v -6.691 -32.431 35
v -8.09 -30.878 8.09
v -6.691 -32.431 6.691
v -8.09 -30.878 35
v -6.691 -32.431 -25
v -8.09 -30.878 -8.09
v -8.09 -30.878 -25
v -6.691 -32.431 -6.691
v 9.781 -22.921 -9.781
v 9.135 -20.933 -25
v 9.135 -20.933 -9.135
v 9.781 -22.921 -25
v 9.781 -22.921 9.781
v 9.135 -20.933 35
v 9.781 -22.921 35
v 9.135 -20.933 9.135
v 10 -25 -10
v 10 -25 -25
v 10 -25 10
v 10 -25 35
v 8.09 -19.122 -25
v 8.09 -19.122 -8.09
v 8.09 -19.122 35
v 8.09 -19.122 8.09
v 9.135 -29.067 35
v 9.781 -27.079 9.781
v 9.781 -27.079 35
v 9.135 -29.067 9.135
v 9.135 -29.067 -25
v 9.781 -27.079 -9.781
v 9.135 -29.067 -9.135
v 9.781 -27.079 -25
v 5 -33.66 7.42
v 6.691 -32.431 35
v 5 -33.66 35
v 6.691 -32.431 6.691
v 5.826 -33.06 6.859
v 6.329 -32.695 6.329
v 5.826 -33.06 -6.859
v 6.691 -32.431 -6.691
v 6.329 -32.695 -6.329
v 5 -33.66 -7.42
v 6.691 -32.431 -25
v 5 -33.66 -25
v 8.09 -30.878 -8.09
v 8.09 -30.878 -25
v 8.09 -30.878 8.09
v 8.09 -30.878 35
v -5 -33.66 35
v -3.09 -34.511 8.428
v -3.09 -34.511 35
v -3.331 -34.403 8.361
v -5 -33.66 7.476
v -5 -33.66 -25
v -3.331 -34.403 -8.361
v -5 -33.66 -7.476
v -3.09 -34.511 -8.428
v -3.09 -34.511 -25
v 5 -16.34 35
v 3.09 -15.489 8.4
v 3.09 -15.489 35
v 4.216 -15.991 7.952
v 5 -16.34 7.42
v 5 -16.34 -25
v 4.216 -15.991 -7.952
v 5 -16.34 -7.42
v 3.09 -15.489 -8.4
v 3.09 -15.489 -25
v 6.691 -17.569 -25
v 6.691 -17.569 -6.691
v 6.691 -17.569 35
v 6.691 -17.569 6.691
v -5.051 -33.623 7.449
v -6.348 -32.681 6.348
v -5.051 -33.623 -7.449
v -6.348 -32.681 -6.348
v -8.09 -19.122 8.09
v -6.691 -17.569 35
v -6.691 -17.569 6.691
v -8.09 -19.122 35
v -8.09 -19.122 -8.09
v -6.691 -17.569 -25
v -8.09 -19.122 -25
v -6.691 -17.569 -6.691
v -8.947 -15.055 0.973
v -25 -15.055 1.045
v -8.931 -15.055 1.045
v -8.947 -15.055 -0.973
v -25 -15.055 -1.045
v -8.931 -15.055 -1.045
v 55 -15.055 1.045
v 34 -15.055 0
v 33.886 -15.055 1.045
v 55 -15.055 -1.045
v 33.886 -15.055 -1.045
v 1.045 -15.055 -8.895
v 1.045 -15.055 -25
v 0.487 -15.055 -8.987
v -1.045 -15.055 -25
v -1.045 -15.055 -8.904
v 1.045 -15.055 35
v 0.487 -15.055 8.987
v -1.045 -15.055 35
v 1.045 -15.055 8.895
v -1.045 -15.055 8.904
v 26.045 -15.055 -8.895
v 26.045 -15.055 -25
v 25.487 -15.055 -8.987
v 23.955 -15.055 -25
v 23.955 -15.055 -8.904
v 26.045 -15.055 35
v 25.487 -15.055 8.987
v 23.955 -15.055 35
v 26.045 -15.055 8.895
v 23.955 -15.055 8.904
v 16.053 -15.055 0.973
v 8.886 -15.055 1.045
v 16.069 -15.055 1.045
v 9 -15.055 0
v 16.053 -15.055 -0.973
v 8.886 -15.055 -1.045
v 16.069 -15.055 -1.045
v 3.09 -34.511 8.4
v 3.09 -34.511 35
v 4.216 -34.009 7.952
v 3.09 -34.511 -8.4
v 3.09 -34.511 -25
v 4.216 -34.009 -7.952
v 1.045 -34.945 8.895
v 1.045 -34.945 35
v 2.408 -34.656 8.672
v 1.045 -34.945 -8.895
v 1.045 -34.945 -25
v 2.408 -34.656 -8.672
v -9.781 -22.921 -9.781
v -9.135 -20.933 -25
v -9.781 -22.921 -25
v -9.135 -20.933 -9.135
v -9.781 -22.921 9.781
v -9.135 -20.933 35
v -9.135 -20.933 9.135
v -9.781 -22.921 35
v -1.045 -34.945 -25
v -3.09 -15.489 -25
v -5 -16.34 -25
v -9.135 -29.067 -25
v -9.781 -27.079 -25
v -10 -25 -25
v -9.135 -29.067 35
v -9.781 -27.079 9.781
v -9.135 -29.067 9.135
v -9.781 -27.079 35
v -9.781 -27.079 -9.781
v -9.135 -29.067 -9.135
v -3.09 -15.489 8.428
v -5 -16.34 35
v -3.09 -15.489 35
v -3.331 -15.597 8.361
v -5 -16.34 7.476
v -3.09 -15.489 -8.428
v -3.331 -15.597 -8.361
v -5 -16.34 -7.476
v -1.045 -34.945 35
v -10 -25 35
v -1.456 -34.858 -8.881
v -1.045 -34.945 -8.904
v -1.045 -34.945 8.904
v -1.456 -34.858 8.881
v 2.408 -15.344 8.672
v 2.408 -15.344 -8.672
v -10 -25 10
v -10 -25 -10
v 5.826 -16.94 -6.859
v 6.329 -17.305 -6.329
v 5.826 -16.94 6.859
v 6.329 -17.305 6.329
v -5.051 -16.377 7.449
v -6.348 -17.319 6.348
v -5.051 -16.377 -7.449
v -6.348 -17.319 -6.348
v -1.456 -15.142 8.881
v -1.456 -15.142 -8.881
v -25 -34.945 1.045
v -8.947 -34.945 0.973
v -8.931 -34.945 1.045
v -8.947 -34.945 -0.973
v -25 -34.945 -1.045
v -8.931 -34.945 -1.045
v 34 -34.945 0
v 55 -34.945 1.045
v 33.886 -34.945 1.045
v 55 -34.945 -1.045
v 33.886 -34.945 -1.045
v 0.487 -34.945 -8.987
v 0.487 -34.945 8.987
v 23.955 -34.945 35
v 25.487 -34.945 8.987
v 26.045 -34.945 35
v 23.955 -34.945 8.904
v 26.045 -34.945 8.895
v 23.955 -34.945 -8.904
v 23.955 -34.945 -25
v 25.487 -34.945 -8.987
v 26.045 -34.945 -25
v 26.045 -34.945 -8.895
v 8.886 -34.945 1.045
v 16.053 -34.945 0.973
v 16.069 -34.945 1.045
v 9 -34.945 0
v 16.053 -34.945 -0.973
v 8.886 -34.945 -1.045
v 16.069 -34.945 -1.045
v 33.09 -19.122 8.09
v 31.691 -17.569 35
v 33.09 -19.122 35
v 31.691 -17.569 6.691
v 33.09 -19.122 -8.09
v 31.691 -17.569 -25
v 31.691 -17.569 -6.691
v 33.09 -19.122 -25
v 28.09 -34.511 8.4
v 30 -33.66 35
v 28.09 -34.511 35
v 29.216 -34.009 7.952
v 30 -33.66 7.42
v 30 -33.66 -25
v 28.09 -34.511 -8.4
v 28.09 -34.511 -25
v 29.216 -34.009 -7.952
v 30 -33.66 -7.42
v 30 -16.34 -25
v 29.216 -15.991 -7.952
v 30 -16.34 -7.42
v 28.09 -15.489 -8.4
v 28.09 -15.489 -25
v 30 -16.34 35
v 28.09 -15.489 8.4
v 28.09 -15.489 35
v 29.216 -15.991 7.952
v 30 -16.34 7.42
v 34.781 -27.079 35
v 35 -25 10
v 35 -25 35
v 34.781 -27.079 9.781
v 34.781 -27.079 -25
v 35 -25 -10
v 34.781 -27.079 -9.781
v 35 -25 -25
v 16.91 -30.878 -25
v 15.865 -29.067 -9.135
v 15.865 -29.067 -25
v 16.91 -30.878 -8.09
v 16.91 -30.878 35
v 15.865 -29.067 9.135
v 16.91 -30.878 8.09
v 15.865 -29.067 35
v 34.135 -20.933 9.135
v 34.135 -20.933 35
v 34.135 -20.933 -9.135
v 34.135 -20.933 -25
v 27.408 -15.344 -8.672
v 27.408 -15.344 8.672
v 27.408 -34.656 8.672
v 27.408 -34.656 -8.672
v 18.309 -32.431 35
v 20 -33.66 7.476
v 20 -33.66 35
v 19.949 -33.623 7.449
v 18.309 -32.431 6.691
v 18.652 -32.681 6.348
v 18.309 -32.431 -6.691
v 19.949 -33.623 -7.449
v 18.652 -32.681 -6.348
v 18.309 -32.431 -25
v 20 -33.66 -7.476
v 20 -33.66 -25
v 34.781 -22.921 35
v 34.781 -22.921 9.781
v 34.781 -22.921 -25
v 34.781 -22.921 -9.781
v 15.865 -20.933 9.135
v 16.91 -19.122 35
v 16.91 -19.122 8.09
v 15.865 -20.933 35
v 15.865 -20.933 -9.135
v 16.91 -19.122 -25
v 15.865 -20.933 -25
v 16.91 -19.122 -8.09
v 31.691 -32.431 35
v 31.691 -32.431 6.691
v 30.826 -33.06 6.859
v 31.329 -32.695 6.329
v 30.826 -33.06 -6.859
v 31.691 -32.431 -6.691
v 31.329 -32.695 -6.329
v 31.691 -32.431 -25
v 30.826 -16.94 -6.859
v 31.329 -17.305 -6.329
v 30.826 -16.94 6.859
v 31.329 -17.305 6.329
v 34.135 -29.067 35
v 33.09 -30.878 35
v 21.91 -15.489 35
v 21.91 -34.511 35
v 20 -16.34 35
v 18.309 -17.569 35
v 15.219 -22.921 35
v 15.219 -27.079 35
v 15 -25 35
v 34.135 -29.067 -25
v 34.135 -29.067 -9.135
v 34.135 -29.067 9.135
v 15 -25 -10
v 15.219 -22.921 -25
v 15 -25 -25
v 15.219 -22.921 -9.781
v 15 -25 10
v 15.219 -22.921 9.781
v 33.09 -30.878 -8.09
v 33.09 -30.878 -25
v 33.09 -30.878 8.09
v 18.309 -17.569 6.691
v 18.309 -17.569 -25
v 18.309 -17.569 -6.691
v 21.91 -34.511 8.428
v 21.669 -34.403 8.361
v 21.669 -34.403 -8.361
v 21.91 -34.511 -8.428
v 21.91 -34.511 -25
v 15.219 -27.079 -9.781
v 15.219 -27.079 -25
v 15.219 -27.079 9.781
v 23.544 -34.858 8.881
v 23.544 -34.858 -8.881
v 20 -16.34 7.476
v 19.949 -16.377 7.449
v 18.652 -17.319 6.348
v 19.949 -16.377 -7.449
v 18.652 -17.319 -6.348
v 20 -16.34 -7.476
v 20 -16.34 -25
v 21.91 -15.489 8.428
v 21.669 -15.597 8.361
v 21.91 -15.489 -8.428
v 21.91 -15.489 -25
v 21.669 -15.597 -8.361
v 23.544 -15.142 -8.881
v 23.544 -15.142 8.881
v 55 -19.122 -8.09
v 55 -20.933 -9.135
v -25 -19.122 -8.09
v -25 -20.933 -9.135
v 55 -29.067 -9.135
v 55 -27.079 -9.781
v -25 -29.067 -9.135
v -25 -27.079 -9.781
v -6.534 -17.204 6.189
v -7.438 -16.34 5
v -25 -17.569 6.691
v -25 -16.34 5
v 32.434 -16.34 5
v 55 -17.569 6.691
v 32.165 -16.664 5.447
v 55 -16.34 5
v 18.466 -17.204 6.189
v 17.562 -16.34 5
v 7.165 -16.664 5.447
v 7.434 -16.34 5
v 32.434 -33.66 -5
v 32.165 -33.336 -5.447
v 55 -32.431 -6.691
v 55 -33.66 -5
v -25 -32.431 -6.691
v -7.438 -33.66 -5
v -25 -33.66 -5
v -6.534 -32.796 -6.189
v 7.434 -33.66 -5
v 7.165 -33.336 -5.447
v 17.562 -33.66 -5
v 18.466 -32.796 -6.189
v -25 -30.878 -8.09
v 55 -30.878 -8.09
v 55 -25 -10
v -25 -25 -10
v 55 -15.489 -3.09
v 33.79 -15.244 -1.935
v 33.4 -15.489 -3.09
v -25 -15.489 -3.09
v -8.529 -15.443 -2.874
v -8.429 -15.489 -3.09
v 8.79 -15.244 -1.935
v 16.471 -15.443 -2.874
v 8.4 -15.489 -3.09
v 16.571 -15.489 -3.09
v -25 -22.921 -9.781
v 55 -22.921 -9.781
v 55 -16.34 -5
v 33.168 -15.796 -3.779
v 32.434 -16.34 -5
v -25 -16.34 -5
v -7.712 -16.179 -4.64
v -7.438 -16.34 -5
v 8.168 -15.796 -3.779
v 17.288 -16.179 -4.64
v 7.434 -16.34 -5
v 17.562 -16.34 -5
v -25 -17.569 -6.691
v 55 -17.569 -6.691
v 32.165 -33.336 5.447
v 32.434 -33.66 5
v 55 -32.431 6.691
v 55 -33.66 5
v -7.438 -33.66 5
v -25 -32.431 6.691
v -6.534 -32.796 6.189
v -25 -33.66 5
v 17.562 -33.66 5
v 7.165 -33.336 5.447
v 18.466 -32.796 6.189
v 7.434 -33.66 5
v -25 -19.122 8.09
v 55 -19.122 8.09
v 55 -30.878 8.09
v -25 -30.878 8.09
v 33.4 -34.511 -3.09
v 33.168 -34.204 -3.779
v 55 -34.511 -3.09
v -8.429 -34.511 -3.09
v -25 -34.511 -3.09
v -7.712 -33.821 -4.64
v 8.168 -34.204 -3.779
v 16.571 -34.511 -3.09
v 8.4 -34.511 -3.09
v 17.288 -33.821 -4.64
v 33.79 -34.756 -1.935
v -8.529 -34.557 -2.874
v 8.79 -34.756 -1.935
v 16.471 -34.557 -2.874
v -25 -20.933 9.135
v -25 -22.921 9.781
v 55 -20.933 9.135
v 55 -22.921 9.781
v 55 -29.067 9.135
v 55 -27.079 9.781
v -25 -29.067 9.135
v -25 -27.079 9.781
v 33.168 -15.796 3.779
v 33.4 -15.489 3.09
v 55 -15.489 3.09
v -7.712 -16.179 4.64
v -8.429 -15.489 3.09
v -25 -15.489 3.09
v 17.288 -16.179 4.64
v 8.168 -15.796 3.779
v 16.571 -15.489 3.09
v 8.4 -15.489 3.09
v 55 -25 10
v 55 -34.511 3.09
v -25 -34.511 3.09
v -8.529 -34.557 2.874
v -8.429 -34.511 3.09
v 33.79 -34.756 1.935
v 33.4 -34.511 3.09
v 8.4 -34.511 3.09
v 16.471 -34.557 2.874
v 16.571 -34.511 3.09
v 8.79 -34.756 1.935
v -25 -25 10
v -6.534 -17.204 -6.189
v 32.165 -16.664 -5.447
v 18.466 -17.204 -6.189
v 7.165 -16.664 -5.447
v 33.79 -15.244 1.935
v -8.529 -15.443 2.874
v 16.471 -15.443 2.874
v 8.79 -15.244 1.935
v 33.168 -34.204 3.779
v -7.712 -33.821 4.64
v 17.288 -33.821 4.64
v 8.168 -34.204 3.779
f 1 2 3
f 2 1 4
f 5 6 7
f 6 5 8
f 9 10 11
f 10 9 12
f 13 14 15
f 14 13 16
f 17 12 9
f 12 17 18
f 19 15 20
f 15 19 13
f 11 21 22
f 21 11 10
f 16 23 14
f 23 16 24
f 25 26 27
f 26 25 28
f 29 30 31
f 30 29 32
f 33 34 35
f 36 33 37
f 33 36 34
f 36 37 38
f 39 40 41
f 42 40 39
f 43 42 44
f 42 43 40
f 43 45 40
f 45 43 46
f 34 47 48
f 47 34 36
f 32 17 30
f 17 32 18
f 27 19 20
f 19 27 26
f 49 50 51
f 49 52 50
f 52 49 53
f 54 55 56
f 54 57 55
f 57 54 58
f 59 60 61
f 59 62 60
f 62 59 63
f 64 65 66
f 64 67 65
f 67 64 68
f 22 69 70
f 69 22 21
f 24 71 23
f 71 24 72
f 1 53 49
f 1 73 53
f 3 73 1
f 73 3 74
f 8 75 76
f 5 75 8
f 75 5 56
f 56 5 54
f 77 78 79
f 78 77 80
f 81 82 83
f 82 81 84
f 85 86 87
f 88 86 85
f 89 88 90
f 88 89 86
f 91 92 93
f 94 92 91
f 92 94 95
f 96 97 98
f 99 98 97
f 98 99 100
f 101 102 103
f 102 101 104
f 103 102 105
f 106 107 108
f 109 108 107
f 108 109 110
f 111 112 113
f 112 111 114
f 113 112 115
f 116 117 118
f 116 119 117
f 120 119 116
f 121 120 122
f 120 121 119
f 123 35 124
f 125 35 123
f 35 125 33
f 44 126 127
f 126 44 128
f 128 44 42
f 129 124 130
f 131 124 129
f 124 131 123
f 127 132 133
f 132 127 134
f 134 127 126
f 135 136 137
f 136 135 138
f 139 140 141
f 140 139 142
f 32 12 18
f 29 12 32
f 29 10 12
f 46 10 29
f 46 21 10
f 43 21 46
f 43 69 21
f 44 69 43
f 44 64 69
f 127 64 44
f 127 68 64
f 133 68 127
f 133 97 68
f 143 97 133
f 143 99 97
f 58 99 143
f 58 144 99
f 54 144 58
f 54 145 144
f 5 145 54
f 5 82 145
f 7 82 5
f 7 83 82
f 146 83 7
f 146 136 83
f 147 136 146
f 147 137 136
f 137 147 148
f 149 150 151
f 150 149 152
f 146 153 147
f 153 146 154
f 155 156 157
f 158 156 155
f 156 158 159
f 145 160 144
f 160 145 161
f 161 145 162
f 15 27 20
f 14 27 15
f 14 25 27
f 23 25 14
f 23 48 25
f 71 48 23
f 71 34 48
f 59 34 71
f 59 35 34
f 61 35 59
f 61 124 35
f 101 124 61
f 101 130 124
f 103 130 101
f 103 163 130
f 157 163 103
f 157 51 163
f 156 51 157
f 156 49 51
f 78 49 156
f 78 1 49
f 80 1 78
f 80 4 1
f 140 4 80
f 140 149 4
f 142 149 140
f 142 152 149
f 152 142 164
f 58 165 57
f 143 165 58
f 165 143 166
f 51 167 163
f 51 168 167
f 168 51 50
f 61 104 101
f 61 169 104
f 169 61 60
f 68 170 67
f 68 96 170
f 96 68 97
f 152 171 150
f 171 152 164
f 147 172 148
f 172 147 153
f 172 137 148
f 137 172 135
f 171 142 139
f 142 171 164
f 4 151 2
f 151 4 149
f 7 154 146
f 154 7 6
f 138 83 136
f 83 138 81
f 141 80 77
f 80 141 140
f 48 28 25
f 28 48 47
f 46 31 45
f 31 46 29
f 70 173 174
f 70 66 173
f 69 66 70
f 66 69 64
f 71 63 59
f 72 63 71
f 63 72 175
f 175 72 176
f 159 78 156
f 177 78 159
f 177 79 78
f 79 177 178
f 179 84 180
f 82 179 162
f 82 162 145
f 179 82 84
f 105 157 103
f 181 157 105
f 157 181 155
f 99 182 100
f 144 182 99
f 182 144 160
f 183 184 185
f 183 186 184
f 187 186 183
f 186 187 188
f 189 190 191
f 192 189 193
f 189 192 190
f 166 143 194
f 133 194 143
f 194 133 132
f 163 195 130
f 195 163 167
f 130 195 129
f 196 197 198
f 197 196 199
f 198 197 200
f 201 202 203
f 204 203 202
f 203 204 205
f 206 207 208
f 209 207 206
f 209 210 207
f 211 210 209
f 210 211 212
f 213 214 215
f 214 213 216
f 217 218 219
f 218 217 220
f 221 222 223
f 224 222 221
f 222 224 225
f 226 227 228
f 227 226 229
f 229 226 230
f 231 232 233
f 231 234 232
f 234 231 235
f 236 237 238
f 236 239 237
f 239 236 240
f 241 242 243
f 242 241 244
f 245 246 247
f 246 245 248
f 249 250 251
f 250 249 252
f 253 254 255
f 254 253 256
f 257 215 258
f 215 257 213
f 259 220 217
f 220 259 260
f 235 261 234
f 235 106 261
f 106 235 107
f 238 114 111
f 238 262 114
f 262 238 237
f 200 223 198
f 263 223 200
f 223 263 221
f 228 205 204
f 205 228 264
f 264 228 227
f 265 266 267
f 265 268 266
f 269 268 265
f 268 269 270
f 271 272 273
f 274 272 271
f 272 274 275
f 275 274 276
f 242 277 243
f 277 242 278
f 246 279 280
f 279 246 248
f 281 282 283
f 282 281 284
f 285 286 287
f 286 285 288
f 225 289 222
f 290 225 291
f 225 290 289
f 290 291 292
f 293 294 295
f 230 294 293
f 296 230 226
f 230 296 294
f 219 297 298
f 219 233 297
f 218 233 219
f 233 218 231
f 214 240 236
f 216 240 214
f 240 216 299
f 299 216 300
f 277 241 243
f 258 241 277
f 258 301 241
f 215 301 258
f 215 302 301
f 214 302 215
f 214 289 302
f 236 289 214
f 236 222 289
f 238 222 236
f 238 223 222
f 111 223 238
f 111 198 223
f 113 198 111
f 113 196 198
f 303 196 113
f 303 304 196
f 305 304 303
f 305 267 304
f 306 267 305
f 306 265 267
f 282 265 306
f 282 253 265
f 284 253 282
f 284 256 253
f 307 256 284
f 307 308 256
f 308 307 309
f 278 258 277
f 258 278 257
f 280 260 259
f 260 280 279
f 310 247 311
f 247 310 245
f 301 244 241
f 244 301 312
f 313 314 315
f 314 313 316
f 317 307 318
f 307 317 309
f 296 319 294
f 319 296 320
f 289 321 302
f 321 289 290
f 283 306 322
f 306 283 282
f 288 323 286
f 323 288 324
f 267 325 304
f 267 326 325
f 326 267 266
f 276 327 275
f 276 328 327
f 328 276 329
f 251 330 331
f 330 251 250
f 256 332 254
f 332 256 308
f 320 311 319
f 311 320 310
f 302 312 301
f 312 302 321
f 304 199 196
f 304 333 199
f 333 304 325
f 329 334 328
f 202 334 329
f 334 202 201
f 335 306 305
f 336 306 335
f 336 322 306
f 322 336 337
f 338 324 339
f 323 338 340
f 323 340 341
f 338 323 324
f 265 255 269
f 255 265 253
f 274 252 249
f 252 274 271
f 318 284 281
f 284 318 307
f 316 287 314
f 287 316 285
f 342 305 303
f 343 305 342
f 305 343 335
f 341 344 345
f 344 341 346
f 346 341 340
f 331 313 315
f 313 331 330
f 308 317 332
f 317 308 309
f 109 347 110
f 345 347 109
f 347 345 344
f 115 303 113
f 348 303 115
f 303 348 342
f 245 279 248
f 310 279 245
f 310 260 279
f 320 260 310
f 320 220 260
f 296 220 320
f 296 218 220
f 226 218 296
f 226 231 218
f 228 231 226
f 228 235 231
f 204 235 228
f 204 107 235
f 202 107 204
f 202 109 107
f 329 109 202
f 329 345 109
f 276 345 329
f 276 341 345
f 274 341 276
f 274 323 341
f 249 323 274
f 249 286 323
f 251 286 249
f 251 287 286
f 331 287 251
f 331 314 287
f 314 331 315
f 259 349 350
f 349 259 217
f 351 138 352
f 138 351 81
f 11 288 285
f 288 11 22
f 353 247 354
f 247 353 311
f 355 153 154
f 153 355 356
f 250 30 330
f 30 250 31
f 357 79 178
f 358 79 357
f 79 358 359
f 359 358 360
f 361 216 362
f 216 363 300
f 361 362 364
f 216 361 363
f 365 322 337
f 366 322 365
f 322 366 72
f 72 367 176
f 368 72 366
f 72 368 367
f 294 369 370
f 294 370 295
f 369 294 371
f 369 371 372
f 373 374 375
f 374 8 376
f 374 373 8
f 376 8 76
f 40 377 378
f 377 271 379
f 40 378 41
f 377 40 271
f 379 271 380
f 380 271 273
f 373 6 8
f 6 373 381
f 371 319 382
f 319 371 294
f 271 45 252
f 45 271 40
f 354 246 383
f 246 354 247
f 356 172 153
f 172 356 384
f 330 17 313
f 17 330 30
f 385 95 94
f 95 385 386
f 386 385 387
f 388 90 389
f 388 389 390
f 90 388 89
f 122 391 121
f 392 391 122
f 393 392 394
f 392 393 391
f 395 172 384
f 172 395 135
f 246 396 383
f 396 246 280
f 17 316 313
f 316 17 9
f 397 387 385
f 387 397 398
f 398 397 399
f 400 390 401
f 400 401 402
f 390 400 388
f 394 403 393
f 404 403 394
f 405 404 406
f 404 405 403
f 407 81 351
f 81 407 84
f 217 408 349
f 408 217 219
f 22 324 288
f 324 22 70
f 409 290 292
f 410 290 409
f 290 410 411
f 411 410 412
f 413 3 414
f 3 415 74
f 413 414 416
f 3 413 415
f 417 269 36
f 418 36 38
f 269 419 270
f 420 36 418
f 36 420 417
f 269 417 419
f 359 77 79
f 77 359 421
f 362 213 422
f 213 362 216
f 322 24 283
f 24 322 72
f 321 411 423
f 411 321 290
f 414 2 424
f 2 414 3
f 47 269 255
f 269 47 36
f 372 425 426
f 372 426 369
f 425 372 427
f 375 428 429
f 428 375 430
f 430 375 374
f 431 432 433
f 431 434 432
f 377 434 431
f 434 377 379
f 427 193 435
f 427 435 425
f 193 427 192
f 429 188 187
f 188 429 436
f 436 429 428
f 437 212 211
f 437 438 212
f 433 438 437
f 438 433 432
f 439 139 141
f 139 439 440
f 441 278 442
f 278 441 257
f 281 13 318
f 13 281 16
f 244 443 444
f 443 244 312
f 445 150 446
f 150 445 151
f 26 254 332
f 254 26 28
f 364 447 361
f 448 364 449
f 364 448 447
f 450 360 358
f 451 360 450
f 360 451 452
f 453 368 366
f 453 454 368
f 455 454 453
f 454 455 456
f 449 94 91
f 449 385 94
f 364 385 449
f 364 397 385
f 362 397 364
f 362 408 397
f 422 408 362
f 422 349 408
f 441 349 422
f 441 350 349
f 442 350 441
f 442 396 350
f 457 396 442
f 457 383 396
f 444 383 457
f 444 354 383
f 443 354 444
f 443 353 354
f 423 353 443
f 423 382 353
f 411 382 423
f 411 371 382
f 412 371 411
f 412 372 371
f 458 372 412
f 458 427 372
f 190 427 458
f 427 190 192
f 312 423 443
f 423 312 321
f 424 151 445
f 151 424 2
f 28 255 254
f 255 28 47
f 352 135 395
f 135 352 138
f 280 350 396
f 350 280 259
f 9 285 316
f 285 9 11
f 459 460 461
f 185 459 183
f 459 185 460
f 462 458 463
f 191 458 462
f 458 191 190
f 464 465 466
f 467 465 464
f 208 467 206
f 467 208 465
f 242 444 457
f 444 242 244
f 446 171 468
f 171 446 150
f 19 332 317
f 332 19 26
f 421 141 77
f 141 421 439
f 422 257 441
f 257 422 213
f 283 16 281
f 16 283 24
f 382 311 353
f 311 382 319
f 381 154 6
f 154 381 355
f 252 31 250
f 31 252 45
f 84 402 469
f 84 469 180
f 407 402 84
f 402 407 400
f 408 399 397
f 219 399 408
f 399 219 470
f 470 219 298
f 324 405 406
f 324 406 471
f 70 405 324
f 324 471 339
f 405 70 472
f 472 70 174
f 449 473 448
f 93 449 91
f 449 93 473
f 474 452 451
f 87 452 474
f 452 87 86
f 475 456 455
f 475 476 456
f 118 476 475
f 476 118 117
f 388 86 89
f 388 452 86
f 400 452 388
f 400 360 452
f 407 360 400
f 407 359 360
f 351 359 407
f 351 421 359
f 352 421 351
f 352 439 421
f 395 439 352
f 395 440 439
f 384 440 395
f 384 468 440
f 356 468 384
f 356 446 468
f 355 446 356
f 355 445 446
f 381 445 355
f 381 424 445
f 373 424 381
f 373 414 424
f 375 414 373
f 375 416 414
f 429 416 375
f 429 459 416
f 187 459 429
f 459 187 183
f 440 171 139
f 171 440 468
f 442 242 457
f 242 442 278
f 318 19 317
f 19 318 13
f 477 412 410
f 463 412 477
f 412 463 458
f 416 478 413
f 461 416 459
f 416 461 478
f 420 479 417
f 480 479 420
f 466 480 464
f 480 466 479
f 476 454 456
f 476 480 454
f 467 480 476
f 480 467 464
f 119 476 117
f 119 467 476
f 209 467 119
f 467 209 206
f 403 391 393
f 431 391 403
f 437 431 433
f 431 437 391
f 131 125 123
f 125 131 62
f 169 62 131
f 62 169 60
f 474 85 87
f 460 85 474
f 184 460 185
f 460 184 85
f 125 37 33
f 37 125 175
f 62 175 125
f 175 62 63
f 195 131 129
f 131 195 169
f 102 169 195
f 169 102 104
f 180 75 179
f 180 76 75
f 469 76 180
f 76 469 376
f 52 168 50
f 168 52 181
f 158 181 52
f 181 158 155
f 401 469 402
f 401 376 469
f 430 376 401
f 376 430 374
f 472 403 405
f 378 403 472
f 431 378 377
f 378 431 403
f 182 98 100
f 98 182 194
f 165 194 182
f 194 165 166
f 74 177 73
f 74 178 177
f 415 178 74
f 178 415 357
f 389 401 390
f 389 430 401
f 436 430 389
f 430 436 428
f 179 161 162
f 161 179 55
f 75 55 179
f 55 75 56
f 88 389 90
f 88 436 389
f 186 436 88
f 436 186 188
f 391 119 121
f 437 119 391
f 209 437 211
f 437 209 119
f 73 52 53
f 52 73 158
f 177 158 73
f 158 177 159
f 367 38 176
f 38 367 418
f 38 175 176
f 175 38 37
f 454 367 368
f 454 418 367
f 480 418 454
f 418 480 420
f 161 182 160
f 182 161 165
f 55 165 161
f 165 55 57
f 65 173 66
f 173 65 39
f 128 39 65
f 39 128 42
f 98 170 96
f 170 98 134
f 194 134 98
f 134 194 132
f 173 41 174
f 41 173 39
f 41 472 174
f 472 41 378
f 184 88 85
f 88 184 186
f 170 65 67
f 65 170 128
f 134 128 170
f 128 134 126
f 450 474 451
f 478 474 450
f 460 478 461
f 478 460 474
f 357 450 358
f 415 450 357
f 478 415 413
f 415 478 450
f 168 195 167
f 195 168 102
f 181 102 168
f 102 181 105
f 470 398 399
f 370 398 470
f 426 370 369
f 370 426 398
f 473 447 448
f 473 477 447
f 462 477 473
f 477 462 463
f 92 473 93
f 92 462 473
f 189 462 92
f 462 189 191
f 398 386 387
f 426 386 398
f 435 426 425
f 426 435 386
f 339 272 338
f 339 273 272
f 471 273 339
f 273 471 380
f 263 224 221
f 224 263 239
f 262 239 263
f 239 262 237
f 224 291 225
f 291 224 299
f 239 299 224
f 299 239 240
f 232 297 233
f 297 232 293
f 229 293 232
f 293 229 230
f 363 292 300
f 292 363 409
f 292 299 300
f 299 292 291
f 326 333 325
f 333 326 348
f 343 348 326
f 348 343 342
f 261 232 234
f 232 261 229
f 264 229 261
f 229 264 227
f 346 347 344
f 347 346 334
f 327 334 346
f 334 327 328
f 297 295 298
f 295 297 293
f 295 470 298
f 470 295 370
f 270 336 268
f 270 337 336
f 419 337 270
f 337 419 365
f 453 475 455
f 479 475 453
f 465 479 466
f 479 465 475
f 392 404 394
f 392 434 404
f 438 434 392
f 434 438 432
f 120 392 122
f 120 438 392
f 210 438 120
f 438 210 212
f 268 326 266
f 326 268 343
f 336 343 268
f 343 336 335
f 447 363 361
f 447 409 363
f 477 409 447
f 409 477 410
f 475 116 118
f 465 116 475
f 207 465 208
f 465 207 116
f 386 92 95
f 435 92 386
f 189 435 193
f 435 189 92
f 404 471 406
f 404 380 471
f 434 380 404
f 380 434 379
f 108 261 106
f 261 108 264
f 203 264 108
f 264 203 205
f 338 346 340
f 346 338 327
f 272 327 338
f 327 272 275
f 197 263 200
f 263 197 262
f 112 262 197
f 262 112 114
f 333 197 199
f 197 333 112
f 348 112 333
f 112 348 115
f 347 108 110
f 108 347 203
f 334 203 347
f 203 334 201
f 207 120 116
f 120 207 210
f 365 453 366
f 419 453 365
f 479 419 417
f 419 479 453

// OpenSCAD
//customizable cylinder


left_eye = 9; //[0:9]
right_eye = 9; //[0:9]

difference() 
{ 
union(){
translate([0,-25,-25]) 
	cylinder(60,10,10); 

translate([25,-25,-25]) 
	cylinder(60,10,10); 

translate([-25,-25,0])
rotate([0, 90, 0]) 
	cylinder(80,10,10);
}
translate([0,-5,0])
rotate([90,0,0]) 
	cylinder(40, left_eye, left_eye); 

translate([25,0,0])
rotate([90,0,0]) 
	cylinder(40, right_eye, right_eye); 

}
